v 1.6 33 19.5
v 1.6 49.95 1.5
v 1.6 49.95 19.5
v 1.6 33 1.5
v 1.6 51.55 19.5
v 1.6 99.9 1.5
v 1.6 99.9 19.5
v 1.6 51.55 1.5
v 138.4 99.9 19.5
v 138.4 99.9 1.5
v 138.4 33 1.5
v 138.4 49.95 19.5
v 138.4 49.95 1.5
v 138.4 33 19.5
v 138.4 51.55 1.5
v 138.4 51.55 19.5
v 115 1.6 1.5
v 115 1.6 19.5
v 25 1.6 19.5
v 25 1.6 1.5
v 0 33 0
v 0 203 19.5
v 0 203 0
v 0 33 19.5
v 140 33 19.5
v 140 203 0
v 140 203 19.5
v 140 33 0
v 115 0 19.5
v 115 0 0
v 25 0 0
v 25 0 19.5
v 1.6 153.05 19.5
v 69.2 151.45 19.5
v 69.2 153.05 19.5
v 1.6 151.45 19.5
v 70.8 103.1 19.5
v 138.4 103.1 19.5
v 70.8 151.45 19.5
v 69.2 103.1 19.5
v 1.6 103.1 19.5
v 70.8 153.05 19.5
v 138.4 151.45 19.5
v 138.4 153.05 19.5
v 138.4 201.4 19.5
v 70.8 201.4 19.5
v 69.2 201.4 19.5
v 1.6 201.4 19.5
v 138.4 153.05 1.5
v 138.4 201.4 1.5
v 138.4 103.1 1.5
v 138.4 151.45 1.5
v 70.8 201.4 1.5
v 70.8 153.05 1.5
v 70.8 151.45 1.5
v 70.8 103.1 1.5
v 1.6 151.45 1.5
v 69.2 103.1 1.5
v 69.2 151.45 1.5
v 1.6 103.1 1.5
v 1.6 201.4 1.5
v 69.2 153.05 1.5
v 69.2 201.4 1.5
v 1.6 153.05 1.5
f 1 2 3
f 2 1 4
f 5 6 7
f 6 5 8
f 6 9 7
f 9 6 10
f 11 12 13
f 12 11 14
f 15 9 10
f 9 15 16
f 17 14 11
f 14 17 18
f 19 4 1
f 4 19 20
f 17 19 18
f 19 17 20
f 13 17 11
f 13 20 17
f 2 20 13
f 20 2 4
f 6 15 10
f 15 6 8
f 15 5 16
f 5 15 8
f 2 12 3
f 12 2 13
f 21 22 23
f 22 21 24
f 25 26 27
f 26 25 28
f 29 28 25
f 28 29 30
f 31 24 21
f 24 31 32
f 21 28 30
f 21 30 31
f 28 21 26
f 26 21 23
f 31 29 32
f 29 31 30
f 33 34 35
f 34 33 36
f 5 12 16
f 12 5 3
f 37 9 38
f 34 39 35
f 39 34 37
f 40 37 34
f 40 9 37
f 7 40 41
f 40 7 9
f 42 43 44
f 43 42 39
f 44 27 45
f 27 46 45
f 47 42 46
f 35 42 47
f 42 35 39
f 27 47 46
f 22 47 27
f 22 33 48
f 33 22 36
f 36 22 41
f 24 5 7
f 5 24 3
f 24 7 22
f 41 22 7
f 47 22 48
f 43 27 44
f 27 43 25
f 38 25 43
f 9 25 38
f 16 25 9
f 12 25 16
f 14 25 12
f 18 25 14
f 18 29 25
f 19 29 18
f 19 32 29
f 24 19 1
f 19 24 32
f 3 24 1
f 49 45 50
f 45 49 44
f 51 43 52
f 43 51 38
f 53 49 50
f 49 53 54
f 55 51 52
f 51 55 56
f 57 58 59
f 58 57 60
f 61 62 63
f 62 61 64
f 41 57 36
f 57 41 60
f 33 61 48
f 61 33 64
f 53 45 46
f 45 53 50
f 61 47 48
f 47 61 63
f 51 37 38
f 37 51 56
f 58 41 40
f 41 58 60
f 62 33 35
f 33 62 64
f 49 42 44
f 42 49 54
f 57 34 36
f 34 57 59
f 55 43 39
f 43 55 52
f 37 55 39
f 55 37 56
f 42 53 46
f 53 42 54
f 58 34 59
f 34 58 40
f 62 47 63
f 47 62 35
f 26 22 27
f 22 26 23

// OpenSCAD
// file: ../../lib/parts.scad
/*This is a module for openscad to be able to output multiple parts
It pairs with a python script that actually managed the multi-output.

https://traverseda.github.io/code/partsScad/index.html
*/
multiPartOutput = false;
multiPartFirstRun = false;
multiPartBuildMode = "default";

module part(partName, c = undef, buildmode="default") {
	if (multiPartFirstRun) {
		echo("Defined new part ---", partName);
		echo("Color ---", partName, c);
	}

	if (buildmode==multiPartBuildMode) {
		if (!multiPartOutput) {
			color(c=c)children();
		}

		if (multiPartOutput == partName) {
			color(c=c)children();
		}
	}
}
// main file
include <../../lib/parts.scad>

DRAWER_DEPTH = 203;
DRAWER_WIDTH = 140;
DRAWER_HEIGHT = 39;
DRAWER_FRONT_X_INSET = 25;
DRAWER_FRONT_Y_INSET = 33;

half_depth = DRAWER_DEPTH / 2;
quarter_depth = half_depth / 2;
half_width = DRAWER_WIDTH / 2;
quarter_width = half_width / 2;
half_height = DRAWER_HEIGHT / 2;

NOZZLE_WIDTH = 0.4;

WALL_WIDTH = NOZZLE_WIDTH * 4;
half_wall_width = WALL_WIDTH / 2;
double_wall_width = WALL_WIDTH * 2;
FLOOR_WIDTH = 1.5;

render_helper = 1;

function part_size(size, n)=(size - WALL_WIDTH * (n + 1)) / n;
function renderHelper(size)=size + render_helper;
function doubleRender(size)=size + render_helper * 2;

module drawer_mockup() {
    linear_extrude(DRAWER_HEIGHT)
    polygon([
        [0, DRAWER_FRONT_Y_INSET],
        [0, DRAWER_DEPTH],
        [DRAWER_WIDTH, DRAWER_DEPTH],
        [DRAWER_WIDTH, DRAWER_FRONT_Y_INSET],
        [DRAWER_WIDTH - DRAWER_FRONT_X_INSET, 0],
        [DRAWER_FRONT_X_INSET, 0]
    ]);
}

module front_half(height = half_height) {
    linear_extrude(height)
    polygon([
        [0, DRAWER_FRONT_Y_INSET],
        [0, half_depth],
        [DRAWER_WIDTH, half_depth],
        [DRAWER_WIDTH, DRAWER_FRONT_Y_INSET],
        [DRAWER_WIDTH - DRAWER_FRONT_X_INSET, 0],
        [DRAWER_FRONT_X_INSET, 0]
    ]);
}

module front_half_inset_wall_offset(height = half_height) {
    offset_z = FLOOR_WIDTH;
    
    translate([0, 0, offset_z])
    linear_extrude(height)
    polygon([
        [WALL_WIDTH, DRAWER_FRONT_Y_INSET],
        [WALL_WIDTH, half_depth - WALL_WIDTH],
        [DRAWER_WIDTH - WALL_WIDTH, half_depth - WALL_WIDTH],
        [DRAWER_WIDTH - WALL_WIDTH, DRAWER_FRONT_Y_INSET],
        [DRAWER_WIDTH - DRAWER_FRONT_X_INSET, WALL_WIDTH],
        [DRAWER_FRONT_X_INSET, WALL_WIDTH]
    ]);
}

module front_half_split_2(height = half_height) {
    difference() {
        front_half(height);
        
        difference() {
            front_half_inset_wall_offset(height);
            
            translate([0, quarter_depth - half_wall_width, 0])
            cube([
                DRAWER_WIDTH,
                WALL_WIDTH,
                doubleRender(height)
            ]);
        }
    }
}

module back_half(height = half_height) {
    cube([
        DRAWER_WIDTH,
        half_depth,
        height
    ]);
}

module back_half_inset_wall_offset(height = half_height) {
    translate([WALL_WIDTH, WALL_WIDTH, FLOOR_WIDTH])
    cube([
        DRAWER_WIDTH - double_wall_width,
        half_depth - double_wall_width,
        height
    ]);
}

module back_half_split_4(height = half_height) {
    difference() {
        back_half(height);
        
        difference() {
            back_half_inset_wall_offset(height);
            
            translate([0, quarter_depth - half_wall_width, 0])
            cube([
                DRAWER_WIDTH,
                WALL_WIDTH,
                doubleRender(height)
            ]);
            
            translate([half_width - half_wall_width, 0, 0])
            cube([
                WALL_WIDTH,
                DRAWER_DEPTH,
                doubleRender(height)
            ]);
        }
    }
}

module drawer_inserts_all() {
    front_half_split_2();

    translate([0, 0, half_height])
    front_half_split_2();
    
    translate([0, half_depth, 0])
      back_half_split_4();
    
    translate([0, half_depth, half_height])
    back_half_split_4();
}

module drawer_inserts_spread() {
    part("front_half_split_2.stl") {
        front_half_split_2();
    }
    
    translate([0, half_depth, 0])
    part("back_half_split_4.stl") {
        back_half_split_4();
    }
}

#%drawer_mockup();
drawer_inserts_spread();
